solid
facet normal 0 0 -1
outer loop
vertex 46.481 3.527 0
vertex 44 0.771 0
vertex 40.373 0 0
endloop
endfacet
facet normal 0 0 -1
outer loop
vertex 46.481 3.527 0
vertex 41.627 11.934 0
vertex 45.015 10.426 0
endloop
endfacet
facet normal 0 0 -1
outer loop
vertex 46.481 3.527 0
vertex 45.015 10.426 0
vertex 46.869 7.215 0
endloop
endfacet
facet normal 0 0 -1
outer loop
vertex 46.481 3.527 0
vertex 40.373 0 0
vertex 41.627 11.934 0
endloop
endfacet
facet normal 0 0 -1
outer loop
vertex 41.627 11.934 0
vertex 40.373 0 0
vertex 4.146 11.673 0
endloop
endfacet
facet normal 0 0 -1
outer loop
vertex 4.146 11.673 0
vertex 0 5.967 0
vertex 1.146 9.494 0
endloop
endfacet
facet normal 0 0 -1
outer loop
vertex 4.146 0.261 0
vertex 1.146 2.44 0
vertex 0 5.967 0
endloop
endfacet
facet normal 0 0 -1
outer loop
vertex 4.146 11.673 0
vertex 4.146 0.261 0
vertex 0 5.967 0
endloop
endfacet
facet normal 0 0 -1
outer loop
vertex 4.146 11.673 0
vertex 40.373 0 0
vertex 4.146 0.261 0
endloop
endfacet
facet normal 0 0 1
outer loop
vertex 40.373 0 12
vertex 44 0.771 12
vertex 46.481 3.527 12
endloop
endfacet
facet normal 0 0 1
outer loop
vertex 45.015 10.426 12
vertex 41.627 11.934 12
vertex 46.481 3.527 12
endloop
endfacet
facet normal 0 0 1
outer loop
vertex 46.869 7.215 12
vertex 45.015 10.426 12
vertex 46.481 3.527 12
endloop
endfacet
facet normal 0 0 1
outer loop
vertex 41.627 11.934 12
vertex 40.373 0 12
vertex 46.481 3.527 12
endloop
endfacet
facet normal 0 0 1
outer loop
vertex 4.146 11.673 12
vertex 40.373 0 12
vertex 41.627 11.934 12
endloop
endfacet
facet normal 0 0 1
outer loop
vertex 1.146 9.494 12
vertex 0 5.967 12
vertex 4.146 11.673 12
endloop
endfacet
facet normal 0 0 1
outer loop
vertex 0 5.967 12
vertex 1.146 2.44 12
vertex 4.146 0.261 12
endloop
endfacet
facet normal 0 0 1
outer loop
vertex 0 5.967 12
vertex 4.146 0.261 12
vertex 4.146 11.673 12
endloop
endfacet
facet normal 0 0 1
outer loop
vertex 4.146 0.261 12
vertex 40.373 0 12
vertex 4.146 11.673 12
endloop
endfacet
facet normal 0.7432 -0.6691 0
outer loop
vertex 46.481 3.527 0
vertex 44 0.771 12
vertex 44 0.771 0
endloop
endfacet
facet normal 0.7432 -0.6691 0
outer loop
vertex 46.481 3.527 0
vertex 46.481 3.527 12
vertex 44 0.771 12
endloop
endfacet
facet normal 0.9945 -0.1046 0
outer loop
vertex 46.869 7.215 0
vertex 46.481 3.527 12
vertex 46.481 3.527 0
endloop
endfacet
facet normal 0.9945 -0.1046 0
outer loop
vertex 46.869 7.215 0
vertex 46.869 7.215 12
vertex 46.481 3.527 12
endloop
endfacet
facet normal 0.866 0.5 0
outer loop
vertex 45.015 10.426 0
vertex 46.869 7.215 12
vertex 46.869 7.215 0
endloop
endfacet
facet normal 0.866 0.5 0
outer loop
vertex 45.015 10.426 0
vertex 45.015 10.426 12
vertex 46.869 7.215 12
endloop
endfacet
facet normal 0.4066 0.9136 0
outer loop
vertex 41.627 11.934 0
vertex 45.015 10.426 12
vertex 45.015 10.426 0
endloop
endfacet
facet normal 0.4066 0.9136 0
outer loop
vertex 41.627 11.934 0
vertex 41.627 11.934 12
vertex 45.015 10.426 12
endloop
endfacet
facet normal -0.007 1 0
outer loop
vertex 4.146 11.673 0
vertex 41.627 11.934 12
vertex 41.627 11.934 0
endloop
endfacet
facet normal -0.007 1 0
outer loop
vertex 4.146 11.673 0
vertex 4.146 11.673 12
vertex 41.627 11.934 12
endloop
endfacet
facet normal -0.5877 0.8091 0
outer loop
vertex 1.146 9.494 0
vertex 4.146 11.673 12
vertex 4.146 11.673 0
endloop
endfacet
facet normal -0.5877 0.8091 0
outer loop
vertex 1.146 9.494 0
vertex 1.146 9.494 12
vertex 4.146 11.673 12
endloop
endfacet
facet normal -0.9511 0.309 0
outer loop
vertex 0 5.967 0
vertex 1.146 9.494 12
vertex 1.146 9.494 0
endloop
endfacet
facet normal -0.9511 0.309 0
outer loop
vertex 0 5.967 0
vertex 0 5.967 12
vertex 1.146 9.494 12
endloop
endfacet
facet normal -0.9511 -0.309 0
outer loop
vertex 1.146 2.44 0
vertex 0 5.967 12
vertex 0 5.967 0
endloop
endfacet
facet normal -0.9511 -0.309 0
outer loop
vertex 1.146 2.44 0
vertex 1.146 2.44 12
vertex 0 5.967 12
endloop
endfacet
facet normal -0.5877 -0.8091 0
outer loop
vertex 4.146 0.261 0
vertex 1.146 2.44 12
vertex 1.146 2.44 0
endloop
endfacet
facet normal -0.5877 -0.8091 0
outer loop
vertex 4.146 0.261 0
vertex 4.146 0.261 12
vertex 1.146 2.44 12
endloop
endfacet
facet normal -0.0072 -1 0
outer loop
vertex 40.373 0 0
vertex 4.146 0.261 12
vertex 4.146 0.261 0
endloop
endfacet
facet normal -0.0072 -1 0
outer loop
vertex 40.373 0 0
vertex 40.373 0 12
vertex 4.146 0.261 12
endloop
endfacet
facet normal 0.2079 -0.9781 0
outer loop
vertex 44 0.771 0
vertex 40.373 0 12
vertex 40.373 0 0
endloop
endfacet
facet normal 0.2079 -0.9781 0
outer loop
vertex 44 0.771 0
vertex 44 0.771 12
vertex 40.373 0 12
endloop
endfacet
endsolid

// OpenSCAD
$fn = 32;

// ----------------------------------------------------------------------
// Lever arm: two bosses 12 and 12 mm, 35 mm between centres
// ----------------------------------------------------------------------

// --- parameters (mm) ---
profile_height = 12;      // extrusion height
profile_points = 11;      // points of the closed outline

profile = [[0, 5.967], [1.146, 2.44], [4.146, 0.261], [40.373, 0], [44, 0.771], [46.481, 3.527], [46.869, 7.215], [45.015, 10.426], [41.627, 11.934], [4.146, 11.673], [1.146, 9.494]];  // single closed polygon, 11 points, counter clockwise

// --- the one profile operation ---
linear_extrude(height = profile_height) polygon(points = profile);
